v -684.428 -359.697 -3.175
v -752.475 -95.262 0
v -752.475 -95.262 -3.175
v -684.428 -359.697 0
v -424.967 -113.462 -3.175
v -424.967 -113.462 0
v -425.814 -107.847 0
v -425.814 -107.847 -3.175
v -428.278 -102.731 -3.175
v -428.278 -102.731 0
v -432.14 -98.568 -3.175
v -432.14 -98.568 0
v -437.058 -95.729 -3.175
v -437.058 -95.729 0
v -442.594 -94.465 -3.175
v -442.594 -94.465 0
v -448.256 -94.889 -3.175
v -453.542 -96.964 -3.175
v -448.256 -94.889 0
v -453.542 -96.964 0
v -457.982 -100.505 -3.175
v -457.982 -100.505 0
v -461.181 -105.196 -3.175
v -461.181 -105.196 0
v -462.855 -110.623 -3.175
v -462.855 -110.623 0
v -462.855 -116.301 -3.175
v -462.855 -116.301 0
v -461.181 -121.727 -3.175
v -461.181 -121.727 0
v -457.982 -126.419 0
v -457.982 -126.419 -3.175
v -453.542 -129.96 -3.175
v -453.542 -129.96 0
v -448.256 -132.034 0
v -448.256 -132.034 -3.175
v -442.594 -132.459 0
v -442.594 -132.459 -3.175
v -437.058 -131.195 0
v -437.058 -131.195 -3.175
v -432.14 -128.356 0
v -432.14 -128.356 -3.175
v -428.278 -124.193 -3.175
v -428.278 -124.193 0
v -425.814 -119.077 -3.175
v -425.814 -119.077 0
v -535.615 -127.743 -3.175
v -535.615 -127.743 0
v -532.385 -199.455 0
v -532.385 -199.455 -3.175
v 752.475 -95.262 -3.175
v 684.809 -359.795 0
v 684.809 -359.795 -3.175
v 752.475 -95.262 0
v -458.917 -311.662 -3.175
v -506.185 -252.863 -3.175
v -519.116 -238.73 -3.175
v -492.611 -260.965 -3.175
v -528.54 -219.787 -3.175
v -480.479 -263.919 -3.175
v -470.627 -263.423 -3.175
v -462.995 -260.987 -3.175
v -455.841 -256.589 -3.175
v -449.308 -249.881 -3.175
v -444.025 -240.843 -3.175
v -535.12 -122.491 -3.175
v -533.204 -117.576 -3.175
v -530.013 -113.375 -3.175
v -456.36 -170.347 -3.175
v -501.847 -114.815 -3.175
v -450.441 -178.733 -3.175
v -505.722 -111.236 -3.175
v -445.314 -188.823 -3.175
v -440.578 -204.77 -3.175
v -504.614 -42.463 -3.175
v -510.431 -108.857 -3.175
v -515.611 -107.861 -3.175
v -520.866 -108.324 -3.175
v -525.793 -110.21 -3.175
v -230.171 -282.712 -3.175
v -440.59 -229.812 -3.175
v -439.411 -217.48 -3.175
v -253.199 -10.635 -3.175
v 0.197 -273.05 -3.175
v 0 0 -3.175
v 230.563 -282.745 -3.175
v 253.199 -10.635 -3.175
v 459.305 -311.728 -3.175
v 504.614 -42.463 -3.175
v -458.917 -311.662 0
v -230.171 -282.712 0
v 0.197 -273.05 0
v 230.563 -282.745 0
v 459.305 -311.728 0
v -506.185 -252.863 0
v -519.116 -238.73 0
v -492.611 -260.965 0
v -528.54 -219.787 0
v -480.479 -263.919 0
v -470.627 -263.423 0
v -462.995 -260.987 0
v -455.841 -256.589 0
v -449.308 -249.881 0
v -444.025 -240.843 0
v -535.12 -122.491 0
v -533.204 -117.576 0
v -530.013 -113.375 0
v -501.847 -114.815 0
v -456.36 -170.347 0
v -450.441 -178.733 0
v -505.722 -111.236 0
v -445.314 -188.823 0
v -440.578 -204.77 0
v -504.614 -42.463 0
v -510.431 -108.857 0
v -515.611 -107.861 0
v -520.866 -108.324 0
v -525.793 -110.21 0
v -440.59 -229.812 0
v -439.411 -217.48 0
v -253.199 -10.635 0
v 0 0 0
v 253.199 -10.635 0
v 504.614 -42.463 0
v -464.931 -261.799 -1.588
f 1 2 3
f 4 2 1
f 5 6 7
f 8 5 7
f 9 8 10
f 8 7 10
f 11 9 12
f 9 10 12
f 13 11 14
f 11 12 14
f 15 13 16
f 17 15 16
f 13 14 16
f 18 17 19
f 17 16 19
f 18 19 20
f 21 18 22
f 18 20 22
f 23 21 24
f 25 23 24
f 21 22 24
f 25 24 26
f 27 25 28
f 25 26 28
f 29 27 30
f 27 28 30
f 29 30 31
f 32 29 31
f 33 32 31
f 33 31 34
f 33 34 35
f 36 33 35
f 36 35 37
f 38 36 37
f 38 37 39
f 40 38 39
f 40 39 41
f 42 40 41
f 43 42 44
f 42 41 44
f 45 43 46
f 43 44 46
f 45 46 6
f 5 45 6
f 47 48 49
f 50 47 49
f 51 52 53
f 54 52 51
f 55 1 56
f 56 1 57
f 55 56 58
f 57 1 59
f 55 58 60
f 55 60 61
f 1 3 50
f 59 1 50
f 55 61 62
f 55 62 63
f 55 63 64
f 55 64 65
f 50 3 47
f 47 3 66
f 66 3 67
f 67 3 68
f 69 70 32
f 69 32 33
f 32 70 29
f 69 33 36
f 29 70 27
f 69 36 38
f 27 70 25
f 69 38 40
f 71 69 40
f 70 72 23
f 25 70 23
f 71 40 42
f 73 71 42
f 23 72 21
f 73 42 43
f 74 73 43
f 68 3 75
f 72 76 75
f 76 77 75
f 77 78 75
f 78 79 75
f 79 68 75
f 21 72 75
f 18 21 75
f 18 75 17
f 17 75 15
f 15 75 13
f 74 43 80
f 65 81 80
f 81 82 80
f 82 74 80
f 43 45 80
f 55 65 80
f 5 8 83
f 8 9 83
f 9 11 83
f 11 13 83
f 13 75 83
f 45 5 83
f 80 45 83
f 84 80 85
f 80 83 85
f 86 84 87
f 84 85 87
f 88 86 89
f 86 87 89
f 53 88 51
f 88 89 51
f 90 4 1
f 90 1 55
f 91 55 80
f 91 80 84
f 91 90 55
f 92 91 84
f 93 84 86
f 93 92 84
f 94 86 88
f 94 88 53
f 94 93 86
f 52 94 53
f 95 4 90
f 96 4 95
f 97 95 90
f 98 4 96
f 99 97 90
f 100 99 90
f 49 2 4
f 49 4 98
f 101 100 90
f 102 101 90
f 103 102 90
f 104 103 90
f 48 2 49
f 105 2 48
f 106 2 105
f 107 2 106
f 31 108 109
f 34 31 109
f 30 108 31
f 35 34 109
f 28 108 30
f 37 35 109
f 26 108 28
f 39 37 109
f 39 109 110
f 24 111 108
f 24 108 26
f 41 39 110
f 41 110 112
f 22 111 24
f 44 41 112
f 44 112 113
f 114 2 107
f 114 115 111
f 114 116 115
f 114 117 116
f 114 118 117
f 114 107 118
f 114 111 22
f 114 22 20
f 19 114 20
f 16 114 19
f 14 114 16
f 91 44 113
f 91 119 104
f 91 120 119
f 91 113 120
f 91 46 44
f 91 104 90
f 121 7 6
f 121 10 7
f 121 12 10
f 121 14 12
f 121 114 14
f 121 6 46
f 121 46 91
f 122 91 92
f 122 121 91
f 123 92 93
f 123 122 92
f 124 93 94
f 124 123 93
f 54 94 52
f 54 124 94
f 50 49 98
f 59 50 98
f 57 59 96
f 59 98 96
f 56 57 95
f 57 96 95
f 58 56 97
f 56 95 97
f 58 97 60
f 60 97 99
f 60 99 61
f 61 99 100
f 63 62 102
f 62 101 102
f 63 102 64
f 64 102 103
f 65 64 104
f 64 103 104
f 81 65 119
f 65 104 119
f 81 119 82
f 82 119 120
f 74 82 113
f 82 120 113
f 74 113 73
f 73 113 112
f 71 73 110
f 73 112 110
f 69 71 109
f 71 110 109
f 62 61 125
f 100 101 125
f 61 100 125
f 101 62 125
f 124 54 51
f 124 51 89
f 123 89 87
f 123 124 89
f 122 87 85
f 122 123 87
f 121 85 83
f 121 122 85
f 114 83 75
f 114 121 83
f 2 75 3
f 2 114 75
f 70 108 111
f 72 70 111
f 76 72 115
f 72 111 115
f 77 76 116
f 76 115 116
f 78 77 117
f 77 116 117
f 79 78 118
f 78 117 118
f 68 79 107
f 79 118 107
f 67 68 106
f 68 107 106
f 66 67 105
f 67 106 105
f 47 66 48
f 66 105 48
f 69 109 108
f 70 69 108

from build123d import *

# Parameters (mm, degrees)
SKETCH1_R          = 19.05
BASE_EXTRUDE_DEPTH = 3.175


with BuildPart() as part:
    # Sketch1 → Base-Extrude (new body)
    with BuildSketch(Plane.XY):
        with BuildLine():
            Line((-752.475, -95.262203185), (-684.4284, -359.69737999))
            ThreePointArc((-684.4284, -359.69737999), (0.19670941, -273.050007044), (684.8094, -359.795448169))
            Line((684.8094, -359.795448169), (752.475, -95.262203185))
            ThreePointArc((752.475, -95.262203185), (0, 0), (-752.475, -95.262203185))
        make_face()
        with Locations((-444.0174, -113.4618)):
            Circle(SKETCH1_R, mode=Mode.SUBTRACT)
        with BuildLine():
            Line((-535.614695533, -127.743373783), (-532.38464705, -199.45456113))
            add(Edge.make_bspline(
                [(-532.38464705, -199.45456113), (-528.480595277, -286.129479355), (-464.930974485, -261.798673459), (-401.381353693, -237.467867563), (-456.359855014, -170.347472288)],
                knots=[4.298855998, 4.298855998, 4.298855998, 6.283185307, 6.283185307, 8.267514616, 8.267514616, 8.267514616], degree=2, weights=[1, 0.546878869, 1, 0.546878869, 1]))
            Line((-456.359855014, -170.347472288), (-501.846758135, -114.814876019))
            ThreePointArc((-501.846758135, -114.814876019), (-523.395377478, -109.095526016), (-535.614695533, -127.743373783))
        make_face(mode=Mode.SUBTRACT)
    extrude(amount=-BASE_EXTRUDE_DEPTH)


solid = part.part
